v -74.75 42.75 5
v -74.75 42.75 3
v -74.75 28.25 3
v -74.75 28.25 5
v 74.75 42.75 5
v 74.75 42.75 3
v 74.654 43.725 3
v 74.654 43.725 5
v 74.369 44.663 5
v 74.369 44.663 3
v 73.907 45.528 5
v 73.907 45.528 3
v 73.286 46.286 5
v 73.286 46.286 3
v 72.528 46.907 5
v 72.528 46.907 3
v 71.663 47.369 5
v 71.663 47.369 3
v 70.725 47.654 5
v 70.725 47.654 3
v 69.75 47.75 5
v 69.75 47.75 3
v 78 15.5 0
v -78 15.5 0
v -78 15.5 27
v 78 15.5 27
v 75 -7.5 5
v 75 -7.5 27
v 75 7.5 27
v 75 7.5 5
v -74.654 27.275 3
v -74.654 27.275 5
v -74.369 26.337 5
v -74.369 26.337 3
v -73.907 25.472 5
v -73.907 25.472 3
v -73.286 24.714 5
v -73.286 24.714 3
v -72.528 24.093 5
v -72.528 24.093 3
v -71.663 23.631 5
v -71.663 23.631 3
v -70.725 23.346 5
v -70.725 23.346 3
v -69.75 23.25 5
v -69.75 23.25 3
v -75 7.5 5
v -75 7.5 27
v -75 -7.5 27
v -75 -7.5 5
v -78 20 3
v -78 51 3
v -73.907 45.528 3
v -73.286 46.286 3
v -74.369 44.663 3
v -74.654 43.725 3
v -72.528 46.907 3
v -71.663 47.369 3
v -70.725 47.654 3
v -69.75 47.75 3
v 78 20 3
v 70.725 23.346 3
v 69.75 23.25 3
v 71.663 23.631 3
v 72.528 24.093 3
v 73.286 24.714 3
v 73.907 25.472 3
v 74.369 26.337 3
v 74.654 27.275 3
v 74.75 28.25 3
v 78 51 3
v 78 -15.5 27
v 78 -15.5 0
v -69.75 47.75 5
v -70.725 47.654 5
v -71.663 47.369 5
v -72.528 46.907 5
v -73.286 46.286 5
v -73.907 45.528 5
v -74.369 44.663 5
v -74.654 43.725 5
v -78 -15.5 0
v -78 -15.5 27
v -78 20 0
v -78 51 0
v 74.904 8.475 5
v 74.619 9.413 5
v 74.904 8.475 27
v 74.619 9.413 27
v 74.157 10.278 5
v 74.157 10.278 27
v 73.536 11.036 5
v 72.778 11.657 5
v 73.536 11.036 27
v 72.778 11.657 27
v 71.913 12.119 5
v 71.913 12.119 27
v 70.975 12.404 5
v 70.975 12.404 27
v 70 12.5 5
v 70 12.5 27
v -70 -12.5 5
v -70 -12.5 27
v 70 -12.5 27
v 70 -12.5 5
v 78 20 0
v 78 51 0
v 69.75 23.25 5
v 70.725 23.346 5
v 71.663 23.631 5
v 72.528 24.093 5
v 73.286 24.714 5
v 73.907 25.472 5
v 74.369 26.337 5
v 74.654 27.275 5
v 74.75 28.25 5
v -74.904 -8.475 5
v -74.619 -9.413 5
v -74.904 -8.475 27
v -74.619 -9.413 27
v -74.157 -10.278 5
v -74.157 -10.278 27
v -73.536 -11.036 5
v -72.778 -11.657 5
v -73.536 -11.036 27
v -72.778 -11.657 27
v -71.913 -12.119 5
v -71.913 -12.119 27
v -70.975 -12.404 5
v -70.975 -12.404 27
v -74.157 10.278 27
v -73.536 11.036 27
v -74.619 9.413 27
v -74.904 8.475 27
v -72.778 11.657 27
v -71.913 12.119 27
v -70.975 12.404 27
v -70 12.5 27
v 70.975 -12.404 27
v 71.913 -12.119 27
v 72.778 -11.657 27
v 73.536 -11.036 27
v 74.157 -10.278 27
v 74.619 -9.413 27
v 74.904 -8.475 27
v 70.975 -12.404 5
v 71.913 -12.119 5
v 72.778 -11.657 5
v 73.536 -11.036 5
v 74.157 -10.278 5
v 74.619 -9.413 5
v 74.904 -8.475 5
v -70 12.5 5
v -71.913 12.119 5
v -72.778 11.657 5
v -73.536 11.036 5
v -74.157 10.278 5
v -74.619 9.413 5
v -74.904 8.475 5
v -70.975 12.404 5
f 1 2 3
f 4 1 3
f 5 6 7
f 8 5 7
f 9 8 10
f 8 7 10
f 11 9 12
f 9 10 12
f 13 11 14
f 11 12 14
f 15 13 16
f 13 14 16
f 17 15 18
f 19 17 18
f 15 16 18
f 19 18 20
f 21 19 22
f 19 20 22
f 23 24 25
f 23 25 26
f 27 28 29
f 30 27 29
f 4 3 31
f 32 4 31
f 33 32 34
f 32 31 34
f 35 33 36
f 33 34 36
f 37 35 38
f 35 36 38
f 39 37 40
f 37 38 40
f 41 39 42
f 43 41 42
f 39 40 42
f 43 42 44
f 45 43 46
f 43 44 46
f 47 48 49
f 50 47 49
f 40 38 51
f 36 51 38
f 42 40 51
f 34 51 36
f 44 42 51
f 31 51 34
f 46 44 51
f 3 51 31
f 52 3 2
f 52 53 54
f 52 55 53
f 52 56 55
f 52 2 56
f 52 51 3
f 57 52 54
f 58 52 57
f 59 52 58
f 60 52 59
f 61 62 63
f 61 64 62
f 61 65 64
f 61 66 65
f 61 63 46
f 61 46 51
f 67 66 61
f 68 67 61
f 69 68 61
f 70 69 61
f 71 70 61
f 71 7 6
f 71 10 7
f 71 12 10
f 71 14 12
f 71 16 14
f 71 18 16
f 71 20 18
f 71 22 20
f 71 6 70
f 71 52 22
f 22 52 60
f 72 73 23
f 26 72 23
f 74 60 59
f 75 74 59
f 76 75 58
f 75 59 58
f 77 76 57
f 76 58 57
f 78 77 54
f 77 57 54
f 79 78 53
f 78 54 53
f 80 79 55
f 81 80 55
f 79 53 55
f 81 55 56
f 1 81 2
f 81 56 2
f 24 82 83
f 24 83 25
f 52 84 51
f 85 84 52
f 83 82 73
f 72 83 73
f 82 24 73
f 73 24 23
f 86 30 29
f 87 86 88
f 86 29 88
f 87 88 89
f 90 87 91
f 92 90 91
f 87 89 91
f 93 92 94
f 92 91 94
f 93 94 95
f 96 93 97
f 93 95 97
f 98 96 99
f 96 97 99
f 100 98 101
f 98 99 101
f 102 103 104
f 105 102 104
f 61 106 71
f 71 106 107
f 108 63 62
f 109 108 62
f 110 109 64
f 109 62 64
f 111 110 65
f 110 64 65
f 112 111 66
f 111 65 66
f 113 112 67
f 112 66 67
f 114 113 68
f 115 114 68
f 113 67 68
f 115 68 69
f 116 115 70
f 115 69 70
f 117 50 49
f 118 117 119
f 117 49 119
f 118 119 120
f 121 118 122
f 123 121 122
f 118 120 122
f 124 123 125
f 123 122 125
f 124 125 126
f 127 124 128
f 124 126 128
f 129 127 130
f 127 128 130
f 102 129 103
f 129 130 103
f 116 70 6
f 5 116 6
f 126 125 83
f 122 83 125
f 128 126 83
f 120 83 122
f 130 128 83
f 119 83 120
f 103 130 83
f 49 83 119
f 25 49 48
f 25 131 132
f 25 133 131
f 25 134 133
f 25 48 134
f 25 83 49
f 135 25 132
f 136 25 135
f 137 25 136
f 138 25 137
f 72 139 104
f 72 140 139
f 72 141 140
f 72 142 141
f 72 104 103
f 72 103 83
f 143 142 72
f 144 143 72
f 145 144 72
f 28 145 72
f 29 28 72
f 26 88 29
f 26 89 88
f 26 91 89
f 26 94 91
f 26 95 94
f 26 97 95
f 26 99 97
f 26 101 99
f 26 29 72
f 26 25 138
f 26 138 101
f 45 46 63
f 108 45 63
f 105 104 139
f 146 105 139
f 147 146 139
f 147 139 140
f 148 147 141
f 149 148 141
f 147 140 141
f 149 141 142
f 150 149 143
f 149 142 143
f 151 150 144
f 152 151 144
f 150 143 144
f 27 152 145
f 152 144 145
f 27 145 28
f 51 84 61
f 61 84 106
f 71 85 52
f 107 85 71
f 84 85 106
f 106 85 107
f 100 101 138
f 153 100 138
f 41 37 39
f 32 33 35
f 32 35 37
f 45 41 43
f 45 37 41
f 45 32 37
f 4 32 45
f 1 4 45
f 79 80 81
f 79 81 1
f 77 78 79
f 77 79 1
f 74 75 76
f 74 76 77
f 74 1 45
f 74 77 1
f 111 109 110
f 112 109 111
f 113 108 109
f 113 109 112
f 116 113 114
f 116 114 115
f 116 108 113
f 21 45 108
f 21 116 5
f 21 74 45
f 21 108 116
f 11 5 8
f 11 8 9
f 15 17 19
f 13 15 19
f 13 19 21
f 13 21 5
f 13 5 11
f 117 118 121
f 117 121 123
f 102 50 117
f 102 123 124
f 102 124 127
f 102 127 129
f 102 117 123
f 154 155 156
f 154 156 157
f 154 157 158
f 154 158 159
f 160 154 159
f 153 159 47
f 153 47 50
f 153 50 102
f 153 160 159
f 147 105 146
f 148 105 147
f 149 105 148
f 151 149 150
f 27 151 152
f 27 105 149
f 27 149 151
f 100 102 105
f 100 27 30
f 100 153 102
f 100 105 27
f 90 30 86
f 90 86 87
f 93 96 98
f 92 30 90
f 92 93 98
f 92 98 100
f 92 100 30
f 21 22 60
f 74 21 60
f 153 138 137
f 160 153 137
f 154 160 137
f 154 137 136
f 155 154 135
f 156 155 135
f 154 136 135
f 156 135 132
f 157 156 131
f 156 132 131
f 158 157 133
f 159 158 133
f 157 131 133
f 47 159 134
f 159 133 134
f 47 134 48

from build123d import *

# Parameters (mm, degrees)
F0_W     = 156
F0_H     = 31
F1_DEPTH = 27
F3_DEPTH = 22
F4_W     = 156
F4_H     = 31
F5_DEPTH = 3
F7_DEPTH = 2


with BuildPart() as f1:
    # F0 (on Top) → F1 (new body)
    with BuildSketch(Plane.XY):
        Rectangle(F0_W, F0_H)
    extrude(amount=F1_DEPTH)

    # F2 (on face) → F3 (cut)
    with BuildSketch(Plane.XY.offset(27)):
        with BuildLine():
            ThreePointArc((75, 7.5), (73.535534, 11.035534), (70, 12.5))
            Line((70, 12.5), (-70, 12.5))
            ThreePointArc((-70, 12.5), (-73.535534, 11.035534), (-75, 7.5))
            Line((-75, 7.5), (-75, -7.5))
            ThreePointArc((-75, -7.5), (-73.535534, -11.035534), (-70, -12.5))
            Line((-70, -12.5), (70, -12.5))
            ThreePointArc((70, -12.5), (73.535534, -11.035534), (75, -7.5))
            Line((75, -7.5), (75, 7.5))
        make_face()
    extrude(amount=-F3_DEPTH, mode=Mode.SUBTRACT)


with BuildPart() as f5:
    # F4 (on Top) → F5 (new body)
    with BuildSketch(Plane.XY):
        with Locations((0, 35.5)):
            Rectangle(F4_W, F4_H)
    extrude(amount=F5_DEPTH)

    # F6 (on face) → F7 (join)
    with BuildSketch(Plane.XY.offset(3)):
        with BuildLine():
            ThreePointArc((-74.75, 28.25), (-73.285534, 24.714466), (-69.75, 23.25))
            Line((-69.75, 23.25), (69.75, 23.25))
            ThreePointArc((69.75, 23.25), (73.285534, 24.714466), (74.75, 28.25))
            Line((74.75, 28.25), (74.75, 42.75))
            ThreePointArc((74.75, 42.75), (73.285534, 46.285534), (69.75, 47.75))
            Line((69.75, 47.75), (-69.75, 47.75))
            ThreePointArc((-69.75, 47.75), (-73.285534, 46.285534), (-74.75, 42.75))
            Line((-74.75, 42.75), (-74.75, 28.25))
        make_face()
    extrude(amount=F7_DEPTH)


solid = Compound([f1.part, f5.part])
